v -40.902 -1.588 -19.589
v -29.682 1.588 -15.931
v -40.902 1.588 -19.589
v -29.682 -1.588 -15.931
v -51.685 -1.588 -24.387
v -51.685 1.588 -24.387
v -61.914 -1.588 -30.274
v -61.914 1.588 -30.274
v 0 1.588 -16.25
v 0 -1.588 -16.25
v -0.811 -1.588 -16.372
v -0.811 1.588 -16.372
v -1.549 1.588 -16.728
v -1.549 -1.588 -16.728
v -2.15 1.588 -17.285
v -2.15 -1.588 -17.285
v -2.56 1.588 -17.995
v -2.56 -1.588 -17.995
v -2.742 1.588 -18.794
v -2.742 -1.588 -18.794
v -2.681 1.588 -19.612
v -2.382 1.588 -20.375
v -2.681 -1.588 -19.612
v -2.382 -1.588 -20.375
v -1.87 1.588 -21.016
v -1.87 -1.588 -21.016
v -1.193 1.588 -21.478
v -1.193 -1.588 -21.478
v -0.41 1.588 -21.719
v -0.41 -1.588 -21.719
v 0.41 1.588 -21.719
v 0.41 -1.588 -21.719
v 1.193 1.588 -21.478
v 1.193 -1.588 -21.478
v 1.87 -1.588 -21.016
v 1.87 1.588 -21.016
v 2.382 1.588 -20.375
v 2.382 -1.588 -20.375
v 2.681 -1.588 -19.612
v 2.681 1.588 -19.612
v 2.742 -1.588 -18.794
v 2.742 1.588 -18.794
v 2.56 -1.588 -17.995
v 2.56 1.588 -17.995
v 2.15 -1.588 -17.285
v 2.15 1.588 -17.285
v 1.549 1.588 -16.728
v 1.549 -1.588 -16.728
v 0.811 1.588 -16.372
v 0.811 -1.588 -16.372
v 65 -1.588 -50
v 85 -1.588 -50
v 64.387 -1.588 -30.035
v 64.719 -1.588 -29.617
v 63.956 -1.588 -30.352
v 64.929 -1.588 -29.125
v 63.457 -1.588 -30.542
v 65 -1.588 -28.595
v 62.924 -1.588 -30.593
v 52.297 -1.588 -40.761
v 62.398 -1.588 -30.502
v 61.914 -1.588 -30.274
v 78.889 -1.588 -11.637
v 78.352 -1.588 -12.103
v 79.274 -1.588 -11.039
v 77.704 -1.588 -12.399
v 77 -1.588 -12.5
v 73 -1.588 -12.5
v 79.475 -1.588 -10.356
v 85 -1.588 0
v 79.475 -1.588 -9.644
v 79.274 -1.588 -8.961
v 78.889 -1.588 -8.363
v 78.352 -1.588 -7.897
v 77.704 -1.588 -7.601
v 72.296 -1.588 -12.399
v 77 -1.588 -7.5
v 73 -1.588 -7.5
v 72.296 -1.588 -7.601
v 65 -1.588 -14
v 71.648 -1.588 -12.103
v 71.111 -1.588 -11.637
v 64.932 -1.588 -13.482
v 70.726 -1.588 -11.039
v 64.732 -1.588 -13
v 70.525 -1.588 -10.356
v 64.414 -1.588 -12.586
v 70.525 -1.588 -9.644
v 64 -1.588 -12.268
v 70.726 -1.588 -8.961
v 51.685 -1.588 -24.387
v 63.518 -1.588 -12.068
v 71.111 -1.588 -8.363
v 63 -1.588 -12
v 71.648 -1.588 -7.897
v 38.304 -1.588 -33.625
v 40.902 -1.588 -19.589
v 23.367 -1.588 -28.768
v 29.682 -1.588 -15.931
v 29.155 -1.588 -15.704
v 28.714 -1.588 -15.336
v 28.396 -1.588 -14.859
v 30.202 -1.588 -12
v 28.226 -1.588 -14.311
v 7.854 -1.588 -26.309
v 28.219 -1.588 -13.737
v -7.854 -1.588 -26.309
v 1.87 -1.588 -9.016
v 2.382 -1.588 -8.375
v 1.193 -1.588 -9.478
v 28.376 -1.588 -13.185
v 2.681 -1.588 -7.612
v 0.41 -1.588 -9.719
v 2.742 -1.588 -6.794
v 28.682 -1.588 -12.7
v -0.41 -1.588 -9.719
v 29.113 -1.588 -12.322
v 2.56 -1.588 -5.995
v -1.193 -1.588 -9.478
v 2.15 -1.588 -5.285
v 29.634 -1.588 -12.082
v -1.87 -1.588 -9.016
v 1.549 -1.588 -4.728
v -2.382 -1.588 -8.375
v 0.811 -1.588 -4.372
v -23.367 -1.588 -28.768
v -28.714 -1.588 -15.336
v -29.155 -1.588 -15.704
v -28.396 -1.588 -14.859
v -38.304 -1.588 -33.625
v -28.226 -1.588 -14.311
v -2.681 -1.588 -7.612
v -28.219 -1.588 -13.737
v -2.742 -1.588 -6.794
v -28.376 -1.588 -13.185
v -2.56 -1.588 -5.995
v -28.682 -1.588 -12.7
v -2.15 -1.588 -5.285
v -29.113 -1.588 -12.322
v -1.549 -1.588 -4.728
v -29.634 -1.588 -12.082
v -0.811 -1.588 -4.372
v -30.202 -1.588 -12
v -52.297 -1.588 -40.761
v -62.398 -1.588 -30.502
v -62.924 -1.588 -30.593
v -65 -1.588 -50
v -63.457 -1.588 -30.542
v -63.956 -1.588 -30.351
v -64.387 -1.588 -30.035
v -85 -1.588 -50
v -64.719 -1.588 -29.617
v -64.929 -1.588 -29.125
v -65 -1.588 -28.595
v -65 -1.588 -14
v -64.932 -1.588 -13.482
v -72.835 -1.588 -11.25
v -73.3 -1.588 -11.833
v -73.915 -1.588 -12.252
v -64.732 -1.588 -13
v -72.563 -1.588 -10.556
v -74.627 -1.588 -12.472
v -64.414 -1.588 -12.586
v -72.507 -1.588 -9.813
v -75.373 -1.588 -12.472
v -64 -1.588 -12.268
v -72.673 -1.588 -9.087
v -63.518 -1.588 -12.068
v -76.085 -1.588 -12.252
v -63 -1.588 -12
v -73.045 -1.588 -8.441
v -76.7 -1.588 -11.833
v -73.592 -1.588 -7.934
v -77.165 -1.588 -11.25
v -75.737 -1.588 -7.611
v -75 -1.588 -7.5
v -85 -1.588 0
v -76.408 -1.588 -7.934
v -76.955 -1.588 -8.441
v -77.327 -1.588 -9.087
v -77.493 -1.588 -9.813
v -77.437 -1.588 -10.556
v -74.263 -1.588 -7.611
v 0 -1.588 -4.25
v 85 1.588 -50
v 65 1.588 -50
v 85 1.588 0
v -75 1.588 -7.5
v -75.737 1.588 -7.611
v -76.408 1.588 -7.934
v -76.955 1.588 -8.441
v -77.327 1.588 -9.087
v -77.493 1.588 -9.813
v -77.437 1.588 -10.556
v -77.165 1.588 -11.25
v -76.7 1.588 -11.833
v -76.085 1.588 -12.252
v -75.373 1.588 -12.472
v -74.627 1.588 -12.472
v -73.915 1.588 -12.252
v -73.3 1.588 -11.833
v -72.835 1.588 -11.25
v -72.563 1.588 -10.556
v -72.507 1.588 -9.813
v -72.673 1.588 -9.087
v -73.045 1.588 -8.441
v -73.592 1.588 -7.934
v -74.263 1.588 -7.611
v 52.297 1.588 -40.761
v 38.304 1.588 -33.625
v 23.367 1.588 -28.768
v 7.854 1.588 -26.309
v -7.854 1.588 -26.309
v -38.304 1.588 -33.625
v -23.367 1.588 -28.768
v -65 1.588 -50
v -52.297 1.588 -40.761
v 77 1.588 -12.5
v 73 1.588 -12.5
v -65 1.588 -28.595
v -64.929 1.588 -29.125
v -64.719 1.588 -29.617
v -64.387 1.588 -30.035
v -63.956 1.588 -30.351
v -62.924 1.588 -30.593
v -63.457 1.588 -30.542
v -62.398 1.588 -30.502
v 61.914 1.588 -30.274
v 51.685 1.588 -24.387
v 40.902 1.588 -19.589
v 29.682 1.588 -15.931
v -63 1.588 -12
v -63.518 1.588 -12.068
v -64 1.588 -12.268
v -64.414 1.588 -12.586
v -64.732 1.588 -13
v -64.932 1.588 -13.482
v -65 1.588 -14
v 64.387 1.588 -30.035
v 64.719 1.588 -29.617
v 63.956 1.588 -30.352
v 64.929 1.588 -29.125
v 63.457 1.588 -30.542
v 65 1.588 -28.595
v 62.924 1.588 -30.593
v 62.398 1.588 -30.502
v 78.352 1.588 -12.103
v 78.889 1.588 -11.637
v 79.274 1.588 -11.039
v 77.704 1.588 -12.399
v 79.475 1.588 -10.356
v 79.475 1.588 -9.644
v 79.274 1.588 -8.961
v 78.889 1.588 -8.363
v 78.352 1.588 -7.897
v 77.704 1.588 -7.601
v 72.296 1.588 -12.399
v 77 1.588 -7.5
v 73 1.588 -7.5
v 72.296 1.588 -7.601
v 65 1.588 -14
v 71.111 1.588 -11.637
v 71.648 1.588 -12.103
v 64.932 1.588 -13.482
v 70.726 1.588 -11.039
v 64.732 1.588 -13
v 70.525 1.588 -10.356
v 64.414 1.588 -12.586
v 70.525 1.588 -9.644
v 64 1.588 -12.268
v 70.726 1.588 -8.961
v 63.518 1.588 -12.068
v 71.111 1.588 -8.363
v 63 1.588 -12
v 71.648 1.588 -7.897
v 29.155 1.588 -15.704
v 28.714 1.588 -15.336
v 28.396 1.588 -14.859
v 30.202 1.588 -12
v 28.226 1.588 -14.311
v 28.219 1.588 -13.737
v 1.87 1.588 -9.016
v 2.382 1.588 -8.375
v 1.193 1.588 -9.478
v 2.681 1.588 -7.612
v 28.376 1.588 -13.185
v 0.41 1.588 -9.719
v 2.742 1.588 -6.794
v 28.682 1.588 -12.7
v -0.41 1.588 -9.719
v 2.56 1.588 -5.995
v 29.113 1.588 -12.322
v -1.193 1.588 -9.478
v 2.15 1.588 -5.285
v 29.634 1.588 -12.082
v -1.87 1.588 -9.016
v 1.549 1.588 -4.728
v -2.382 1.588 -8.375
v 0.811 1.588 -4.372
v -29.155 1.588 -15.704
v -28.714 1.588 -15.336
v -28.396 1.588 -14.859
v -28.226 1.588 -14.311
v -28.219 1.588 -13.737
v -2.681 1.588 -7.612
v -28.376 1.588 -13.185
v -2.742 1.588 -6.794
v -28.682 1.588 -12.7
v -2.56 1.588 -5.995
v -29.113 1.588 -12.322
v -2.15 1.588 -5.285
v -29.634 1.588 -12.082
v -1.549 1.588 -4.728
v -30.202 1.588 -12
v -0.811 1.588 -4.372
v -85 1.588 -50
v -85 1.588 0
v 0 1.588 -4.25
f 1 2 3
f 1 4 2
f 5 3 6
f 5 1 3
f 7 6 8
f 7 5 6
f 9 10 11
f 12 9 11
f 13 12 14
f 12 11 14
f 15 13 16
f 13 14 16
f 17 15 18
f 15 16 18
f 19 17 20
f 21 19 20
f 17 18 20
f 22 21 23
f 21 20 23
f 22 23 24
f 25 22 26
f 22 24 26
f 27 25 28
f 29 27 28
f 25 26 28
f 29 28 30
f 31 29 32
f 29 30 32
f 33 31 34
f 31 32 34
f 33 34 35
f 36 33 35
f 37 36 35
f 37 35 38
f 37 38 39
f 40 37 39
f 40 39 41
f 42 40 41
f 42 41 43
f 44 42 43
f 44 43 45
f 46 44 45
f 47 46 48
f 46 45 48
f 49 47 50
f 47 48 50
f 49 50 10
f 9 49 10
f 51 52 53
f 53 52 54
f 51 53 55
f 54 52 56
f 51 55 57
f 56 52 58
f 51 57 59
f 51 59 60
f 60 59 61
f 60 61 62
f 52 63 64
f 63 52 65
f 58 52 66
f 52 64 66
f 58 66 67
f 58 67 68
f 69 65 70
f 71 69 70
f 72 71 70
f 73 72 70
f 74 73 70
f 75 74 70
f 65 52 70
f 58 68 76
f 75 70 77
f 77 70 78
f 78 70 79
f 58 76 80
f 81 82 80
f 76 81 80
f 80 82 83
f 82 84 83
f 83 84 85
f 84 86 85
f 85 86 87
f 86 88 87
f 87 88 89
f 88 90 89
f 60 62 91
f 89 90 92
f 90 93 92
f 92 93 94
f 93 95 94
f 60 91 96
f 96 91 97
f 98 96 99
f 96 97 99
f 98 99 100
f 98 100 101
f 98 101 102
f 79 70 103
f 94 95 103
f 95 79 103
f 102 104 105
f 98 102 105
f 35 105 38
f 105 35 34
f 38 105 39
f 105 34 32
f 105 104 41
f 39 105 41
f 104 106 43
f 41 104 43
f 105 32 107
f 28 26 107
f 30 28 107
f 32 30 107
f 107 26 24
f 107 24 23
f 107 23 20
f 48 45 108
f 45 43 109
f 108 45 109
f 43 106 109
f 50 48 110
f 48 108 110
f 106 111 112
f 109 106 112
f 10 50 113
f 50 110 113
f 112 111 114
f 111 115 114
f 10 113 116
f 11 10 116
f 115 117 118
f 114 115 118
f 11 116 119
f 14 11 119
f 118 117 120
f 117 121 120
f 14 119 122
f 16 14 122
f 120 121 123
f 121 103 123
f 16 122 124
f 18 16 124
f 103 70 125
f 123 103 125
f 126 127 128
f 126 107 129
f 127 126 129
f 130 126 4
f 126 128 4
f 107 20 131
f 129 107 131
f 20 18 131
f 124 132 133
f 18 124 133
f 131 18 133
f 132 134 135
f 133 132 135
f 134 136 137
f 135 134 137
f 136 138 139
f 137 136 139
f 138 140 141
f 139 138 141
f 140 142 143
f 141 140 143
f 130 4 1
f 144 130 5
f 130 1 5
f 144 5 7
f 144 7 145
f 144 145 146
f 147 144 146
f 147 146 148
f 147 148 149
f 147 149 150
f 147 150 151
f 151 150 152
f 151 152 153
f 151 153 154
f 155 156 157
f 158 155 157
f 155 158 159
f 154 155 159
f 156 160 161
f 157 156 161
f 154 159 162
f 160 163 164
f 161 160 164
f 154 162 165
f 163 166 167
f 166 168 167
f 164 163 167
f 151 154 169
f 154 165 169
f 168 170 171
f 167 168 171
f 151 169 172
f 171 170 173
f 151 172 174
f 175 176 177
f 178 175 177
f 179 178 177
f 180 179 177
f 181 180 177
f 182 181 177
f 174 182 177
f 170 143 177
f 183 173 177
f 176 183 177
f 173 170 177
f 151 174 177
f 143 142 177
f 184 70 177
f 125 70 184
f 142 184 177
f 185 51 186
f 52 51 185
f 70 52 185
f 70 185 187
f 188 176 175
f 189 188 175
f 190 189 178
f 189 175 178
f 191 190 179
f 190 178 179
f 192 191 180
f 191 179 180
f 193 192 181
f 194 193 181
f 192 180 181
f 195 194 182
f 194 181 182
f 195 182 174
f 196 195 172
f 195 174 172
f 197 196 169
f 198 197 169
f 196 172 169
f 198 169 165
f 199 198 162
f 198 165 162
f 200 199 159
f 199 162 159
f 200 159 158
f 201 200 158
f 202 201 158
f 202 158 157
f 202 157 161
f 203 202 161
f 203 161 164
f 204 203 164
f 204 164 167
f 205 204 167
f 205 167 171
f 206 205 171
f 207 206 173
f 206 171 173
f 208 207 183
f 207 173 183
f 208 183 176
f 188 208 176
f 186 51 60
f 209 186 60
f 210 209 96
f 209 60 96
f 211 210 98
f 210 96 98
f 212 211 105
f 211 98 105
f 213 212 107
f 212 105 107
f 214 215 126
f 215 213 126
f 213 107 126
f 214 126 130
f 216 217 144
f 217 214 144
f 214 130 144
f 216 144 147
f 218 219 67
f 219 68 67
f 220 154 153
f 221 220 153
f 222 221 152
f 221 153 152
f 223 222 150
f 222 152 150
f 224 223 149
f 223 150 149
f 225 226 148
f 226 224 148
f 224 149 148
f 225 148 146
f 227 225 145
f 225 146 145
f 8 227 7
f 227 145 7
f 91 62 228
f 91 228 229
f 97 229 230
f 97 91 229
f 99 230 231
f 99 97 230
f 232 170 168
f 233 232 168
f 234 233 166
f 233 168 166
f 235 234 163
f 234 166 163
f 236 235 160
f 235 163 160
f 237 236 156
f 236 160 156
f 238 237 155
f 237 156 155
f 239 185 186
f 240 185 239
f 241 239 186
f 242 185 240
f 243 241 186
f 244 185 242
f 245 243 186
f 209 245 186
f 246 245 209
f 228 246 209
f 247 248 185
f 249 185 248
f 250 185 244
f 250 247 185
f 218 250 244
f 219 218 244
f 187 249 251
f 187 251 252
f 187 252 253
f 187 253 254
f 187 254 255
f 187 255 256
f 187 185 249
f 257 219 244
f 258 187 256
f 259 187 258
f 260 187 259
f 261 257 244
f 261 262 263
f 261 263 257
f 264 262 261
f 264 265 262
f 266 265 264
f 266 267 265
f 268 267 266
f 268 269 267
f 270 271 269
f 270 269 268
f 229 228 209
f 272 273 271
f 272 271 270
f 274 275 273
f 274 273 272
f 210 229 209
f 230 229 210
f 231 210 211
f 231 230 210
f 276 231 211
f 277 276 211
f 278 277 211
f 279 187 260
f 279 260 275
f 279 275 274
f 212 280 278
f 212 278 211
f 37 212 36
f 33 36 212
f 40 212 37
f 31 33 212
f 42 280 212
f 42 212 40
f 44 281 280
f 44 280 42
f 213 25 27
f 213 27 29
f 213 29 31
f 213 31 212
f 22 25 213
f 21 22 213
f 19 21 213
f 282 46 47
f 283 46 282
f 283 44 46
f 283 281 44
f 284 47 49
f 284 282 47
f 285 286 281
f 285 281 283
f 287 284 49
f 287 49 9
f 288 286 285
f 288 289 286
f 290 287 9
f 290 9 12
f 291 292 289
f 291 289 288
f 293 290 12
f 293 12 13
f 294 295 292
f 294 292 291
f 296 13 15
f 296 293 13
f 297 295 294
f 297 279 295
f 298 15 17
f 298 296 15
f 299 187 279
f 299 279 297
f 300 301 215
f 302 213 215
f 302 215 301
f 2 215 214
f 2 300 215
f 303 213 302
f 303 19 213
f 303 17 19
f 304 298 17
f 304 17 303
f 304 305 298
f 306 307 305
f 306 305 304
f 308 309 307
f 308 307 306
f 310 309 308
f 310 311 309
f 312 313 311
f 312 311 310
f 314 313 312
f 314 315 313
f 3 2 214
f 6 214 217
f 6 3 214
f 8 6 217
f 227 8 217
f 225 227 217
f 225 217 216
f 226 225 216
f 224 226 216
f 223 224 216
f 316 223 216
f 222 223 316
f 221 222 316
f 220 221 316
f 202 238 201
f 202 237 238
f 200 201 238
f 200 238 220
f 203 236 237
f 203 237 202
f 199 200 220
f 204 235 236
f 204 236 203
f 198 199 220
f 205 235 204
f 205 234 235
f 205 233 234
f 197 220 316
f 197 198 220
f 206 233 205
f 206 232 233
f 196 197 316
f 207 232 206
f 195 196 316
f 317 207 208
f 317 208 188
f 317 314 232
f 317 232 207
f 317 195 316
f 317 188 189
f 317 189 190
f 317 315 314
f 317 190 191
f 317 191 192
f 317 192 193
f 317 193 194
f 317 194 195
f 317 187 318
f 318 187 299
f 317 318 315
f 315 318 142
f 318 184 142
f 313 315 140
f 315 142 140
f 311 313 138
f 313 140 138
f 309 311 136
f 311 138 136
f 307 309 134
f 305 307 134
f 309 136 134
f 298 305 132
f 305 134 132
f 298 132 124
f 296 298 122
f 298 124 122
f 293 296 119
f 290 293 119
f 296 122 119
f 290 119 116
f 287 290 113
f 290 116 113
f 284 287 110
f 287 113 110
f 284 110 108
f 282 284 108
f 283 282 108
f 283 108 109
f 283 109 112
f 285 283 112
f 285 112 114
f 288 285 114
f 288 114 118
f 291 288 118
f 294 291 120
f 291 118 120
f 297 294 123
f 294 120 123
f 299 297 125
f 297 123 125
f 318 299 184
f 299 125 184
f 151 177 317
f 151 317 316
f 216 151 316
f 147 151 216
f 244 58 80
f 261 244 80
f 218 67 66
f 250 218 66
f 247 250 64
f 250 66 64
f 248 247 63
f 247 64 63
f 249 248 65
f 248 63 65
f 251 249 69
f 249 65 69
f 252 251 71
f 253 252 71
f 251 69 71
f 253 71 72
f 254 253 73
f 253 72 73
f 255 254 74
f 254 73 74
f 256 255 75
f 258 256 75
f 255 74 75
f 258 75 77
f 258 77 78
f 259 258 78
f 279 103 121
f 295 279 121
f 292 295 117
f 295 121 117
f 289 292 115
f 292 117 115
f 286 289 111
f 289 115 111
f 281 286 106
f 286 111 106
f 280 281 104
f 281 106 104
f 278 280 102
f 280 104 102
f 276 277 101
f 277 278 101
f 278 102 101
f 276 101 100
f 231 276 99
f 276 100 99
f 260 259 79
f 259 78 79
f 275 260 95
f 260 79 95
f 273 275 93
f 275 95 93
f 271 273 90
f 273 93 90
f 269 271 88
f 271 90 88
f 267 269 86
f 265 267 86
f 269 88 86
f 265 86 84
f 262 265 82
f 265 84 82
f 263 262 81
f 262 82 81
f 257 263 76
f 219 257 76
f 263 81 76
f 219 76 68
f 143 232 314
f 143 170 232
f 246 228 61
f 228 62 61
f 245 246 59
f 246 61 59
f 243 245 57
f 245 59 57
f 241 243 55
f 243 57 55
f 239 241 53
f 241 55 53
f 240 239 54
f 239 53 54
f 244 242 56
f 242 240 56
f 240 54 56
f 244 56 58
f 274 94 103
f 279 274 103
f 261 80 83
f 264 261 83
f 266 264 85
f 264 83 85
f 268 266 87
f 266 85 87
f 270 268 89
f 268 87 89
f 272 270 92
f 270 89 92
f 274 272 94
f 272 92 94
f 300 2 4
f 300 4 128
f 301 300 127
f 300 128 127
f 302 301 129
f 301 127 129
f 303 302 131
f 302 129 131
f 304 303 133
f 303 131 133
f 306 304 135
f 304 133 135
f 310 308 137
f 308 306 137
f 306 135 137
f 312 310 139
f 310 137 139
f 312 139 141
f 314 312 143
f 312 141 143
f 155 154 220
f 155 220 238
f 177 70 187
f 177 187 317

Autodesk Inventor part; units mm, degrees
ref_plane "YZ Plane" through (0, 0, 0) normal (1, 0, 0) x (0, 1, 0)
ref_plane "XZ Plane" through (0, 0, 0) normal (0, 1, 0) x (-1, 0, 0)
ref_plane "XY Plane" through (0, 0, 0) normal (0, 0, 1) x (1, 0, 0)
sketch "Sketch1" plane through (0, 0, 0) normal (0, 1, 0) x (-1, 0, 0)
  line L0 (85, -50) -> (65, -50)
  line L1 (-85, -50) -> (-85, 0)
  line L2 (-85, 0) -> (85, 0)
  line L3 (85, 0) -> (85, -50)
  line L4 (85, -50) -> (-85, 0) construction
  line L5 (-85, -50) -> (85, 0) construction
  arc A0 (65, -50) -> (-65, -50) centre (0, -126.0208) ccw
  line L6 (65, -50) -> (-65, -50) construction
  line L7 (-65, -50) -> (-85, -50)
  line L8 (65, -28.5948) -> (65, -14)
  line L9 (63, -12) -> (30.2021, -12)
  arc A1 (61.914, -30.2742) -> (29.6815, -15.931) centre (0, -126.0208) ccw
  line L10 (0, 0) -> (0, -25)
  arc A2 (30.2021, -12) -> (29.6815, -15.931) centre (30.2021, -14) ccw
  arc A3 (65, -14) -> (63, -12) centre (63, -14) ccw
  arc A4 (61.914, -30.2742) -> (65, -28.5948) centre (63, -28.5948) ccw
  line L11 (-65, -28.5948) -> (-65, -14)
  line L12 (-63, -12) -> (-30.2021, -12)
  arc A5 (-29.6815, -15.931) -> (-61.914, -30.2742) centre (0, -126.0208) ccw
  arc A6 (-29.6815, -15.931) -> (-30.2021, -12) centre (-30.2021, -14) ccw
  arc A7 (-63, -12) -> (-65, -14) centre (-63, -14) ccw
  arc A8 (-65, -28.5948) -> (-61.914, -30.2742) centre (-63, -28.5948) ccw
  point P0 (0, -25)
  point P1 (0, -25)
  point P2 (65, -32.3419)
  point P3 (0, -12)
  dimension "d0" = 170
  dimension "d1" = 50
  dimension "d2" = 26
  dimension "d3" = 20
  dimension "d4" = 12
  dimension "d5" = 20
  dimension "d6" = 2
extrude "Extrusion1" add sketch "Sketch1" along normal mid plane 3.175
sketch "Sketch2" plane through (0, 1.5875, 0) normal (0, 1, 0) x (1, 0, 0)
  line L0 (-85, 0) -> (85, 0) projected
  line L1 (-85, 50) -> (-85, 0) projected
  line L2 (-65, 50) -> (-85, 50) projected
  line L3 (0, 0) -> (0, 15.0505)
  point P0 (-75, 10)
  point P1 (-75, 40)
  point P2 (75, 10)
  point P3 (75, 40)
  dimension "d9" = 10
  dimension "d10" = 10
  dimension "d11" = 10
hole "Hole1" at (-75, 1.5875, -10) at (75, 1.5875, -10) direction (0, -1, 0) diameter 5 end through all clearance for "Flat Head Machine Screw" size "M5" standard "Ansi Metric M Profile"
sketch "Sketch5" plane through (0, 1.5875, 0) normal (0, 1, 0) x (1, 0, 0)
  line L0 (-85, 0) -> (85, 0) projected
  point P0 (0, 0)
  point P1 (0, 7)
  point P2 (0, 19)
  point P3 (0, 0)
  dimension "d38" = 7
  dimension "d39" = 19
hole "Hole4" at (0, 1.5875, -7) at (0, 1.5875, -19) direction (0, -1, 0) diameter 5.5 end through all clearance for "Socket Head Cap Screw" size "M5" standard "Ansi Metric M Profile"
sketch "Sketch6" plane through (0, -1.5875, 0) normal (0, -1, 0) x (1, 0, 0)
  line L0 (73, -10) -> (77, -10) construction
  circle A0 centre (75, -10) radius 2.5 projected
  line L1 (73, -12.5) -> (77, -12.5)
  line L2 (77, -7.5) -> (73, -7.5)
  arc A1 (73, -7.5) -> (73, -12.5) centre (73, -10) ccw
  arc A2 (77, -12.5) -> (77, -7.5) centre (77, -10) ccw
  point P0 (0, 0)
  dimension "d47" = 4
extrude "Extrusion2" cut sketch "Sketch6" against normal blind 25.4
properties part number "Y-Axis_Cross_Bracket_LM3043" material "Aluminum 6061"
